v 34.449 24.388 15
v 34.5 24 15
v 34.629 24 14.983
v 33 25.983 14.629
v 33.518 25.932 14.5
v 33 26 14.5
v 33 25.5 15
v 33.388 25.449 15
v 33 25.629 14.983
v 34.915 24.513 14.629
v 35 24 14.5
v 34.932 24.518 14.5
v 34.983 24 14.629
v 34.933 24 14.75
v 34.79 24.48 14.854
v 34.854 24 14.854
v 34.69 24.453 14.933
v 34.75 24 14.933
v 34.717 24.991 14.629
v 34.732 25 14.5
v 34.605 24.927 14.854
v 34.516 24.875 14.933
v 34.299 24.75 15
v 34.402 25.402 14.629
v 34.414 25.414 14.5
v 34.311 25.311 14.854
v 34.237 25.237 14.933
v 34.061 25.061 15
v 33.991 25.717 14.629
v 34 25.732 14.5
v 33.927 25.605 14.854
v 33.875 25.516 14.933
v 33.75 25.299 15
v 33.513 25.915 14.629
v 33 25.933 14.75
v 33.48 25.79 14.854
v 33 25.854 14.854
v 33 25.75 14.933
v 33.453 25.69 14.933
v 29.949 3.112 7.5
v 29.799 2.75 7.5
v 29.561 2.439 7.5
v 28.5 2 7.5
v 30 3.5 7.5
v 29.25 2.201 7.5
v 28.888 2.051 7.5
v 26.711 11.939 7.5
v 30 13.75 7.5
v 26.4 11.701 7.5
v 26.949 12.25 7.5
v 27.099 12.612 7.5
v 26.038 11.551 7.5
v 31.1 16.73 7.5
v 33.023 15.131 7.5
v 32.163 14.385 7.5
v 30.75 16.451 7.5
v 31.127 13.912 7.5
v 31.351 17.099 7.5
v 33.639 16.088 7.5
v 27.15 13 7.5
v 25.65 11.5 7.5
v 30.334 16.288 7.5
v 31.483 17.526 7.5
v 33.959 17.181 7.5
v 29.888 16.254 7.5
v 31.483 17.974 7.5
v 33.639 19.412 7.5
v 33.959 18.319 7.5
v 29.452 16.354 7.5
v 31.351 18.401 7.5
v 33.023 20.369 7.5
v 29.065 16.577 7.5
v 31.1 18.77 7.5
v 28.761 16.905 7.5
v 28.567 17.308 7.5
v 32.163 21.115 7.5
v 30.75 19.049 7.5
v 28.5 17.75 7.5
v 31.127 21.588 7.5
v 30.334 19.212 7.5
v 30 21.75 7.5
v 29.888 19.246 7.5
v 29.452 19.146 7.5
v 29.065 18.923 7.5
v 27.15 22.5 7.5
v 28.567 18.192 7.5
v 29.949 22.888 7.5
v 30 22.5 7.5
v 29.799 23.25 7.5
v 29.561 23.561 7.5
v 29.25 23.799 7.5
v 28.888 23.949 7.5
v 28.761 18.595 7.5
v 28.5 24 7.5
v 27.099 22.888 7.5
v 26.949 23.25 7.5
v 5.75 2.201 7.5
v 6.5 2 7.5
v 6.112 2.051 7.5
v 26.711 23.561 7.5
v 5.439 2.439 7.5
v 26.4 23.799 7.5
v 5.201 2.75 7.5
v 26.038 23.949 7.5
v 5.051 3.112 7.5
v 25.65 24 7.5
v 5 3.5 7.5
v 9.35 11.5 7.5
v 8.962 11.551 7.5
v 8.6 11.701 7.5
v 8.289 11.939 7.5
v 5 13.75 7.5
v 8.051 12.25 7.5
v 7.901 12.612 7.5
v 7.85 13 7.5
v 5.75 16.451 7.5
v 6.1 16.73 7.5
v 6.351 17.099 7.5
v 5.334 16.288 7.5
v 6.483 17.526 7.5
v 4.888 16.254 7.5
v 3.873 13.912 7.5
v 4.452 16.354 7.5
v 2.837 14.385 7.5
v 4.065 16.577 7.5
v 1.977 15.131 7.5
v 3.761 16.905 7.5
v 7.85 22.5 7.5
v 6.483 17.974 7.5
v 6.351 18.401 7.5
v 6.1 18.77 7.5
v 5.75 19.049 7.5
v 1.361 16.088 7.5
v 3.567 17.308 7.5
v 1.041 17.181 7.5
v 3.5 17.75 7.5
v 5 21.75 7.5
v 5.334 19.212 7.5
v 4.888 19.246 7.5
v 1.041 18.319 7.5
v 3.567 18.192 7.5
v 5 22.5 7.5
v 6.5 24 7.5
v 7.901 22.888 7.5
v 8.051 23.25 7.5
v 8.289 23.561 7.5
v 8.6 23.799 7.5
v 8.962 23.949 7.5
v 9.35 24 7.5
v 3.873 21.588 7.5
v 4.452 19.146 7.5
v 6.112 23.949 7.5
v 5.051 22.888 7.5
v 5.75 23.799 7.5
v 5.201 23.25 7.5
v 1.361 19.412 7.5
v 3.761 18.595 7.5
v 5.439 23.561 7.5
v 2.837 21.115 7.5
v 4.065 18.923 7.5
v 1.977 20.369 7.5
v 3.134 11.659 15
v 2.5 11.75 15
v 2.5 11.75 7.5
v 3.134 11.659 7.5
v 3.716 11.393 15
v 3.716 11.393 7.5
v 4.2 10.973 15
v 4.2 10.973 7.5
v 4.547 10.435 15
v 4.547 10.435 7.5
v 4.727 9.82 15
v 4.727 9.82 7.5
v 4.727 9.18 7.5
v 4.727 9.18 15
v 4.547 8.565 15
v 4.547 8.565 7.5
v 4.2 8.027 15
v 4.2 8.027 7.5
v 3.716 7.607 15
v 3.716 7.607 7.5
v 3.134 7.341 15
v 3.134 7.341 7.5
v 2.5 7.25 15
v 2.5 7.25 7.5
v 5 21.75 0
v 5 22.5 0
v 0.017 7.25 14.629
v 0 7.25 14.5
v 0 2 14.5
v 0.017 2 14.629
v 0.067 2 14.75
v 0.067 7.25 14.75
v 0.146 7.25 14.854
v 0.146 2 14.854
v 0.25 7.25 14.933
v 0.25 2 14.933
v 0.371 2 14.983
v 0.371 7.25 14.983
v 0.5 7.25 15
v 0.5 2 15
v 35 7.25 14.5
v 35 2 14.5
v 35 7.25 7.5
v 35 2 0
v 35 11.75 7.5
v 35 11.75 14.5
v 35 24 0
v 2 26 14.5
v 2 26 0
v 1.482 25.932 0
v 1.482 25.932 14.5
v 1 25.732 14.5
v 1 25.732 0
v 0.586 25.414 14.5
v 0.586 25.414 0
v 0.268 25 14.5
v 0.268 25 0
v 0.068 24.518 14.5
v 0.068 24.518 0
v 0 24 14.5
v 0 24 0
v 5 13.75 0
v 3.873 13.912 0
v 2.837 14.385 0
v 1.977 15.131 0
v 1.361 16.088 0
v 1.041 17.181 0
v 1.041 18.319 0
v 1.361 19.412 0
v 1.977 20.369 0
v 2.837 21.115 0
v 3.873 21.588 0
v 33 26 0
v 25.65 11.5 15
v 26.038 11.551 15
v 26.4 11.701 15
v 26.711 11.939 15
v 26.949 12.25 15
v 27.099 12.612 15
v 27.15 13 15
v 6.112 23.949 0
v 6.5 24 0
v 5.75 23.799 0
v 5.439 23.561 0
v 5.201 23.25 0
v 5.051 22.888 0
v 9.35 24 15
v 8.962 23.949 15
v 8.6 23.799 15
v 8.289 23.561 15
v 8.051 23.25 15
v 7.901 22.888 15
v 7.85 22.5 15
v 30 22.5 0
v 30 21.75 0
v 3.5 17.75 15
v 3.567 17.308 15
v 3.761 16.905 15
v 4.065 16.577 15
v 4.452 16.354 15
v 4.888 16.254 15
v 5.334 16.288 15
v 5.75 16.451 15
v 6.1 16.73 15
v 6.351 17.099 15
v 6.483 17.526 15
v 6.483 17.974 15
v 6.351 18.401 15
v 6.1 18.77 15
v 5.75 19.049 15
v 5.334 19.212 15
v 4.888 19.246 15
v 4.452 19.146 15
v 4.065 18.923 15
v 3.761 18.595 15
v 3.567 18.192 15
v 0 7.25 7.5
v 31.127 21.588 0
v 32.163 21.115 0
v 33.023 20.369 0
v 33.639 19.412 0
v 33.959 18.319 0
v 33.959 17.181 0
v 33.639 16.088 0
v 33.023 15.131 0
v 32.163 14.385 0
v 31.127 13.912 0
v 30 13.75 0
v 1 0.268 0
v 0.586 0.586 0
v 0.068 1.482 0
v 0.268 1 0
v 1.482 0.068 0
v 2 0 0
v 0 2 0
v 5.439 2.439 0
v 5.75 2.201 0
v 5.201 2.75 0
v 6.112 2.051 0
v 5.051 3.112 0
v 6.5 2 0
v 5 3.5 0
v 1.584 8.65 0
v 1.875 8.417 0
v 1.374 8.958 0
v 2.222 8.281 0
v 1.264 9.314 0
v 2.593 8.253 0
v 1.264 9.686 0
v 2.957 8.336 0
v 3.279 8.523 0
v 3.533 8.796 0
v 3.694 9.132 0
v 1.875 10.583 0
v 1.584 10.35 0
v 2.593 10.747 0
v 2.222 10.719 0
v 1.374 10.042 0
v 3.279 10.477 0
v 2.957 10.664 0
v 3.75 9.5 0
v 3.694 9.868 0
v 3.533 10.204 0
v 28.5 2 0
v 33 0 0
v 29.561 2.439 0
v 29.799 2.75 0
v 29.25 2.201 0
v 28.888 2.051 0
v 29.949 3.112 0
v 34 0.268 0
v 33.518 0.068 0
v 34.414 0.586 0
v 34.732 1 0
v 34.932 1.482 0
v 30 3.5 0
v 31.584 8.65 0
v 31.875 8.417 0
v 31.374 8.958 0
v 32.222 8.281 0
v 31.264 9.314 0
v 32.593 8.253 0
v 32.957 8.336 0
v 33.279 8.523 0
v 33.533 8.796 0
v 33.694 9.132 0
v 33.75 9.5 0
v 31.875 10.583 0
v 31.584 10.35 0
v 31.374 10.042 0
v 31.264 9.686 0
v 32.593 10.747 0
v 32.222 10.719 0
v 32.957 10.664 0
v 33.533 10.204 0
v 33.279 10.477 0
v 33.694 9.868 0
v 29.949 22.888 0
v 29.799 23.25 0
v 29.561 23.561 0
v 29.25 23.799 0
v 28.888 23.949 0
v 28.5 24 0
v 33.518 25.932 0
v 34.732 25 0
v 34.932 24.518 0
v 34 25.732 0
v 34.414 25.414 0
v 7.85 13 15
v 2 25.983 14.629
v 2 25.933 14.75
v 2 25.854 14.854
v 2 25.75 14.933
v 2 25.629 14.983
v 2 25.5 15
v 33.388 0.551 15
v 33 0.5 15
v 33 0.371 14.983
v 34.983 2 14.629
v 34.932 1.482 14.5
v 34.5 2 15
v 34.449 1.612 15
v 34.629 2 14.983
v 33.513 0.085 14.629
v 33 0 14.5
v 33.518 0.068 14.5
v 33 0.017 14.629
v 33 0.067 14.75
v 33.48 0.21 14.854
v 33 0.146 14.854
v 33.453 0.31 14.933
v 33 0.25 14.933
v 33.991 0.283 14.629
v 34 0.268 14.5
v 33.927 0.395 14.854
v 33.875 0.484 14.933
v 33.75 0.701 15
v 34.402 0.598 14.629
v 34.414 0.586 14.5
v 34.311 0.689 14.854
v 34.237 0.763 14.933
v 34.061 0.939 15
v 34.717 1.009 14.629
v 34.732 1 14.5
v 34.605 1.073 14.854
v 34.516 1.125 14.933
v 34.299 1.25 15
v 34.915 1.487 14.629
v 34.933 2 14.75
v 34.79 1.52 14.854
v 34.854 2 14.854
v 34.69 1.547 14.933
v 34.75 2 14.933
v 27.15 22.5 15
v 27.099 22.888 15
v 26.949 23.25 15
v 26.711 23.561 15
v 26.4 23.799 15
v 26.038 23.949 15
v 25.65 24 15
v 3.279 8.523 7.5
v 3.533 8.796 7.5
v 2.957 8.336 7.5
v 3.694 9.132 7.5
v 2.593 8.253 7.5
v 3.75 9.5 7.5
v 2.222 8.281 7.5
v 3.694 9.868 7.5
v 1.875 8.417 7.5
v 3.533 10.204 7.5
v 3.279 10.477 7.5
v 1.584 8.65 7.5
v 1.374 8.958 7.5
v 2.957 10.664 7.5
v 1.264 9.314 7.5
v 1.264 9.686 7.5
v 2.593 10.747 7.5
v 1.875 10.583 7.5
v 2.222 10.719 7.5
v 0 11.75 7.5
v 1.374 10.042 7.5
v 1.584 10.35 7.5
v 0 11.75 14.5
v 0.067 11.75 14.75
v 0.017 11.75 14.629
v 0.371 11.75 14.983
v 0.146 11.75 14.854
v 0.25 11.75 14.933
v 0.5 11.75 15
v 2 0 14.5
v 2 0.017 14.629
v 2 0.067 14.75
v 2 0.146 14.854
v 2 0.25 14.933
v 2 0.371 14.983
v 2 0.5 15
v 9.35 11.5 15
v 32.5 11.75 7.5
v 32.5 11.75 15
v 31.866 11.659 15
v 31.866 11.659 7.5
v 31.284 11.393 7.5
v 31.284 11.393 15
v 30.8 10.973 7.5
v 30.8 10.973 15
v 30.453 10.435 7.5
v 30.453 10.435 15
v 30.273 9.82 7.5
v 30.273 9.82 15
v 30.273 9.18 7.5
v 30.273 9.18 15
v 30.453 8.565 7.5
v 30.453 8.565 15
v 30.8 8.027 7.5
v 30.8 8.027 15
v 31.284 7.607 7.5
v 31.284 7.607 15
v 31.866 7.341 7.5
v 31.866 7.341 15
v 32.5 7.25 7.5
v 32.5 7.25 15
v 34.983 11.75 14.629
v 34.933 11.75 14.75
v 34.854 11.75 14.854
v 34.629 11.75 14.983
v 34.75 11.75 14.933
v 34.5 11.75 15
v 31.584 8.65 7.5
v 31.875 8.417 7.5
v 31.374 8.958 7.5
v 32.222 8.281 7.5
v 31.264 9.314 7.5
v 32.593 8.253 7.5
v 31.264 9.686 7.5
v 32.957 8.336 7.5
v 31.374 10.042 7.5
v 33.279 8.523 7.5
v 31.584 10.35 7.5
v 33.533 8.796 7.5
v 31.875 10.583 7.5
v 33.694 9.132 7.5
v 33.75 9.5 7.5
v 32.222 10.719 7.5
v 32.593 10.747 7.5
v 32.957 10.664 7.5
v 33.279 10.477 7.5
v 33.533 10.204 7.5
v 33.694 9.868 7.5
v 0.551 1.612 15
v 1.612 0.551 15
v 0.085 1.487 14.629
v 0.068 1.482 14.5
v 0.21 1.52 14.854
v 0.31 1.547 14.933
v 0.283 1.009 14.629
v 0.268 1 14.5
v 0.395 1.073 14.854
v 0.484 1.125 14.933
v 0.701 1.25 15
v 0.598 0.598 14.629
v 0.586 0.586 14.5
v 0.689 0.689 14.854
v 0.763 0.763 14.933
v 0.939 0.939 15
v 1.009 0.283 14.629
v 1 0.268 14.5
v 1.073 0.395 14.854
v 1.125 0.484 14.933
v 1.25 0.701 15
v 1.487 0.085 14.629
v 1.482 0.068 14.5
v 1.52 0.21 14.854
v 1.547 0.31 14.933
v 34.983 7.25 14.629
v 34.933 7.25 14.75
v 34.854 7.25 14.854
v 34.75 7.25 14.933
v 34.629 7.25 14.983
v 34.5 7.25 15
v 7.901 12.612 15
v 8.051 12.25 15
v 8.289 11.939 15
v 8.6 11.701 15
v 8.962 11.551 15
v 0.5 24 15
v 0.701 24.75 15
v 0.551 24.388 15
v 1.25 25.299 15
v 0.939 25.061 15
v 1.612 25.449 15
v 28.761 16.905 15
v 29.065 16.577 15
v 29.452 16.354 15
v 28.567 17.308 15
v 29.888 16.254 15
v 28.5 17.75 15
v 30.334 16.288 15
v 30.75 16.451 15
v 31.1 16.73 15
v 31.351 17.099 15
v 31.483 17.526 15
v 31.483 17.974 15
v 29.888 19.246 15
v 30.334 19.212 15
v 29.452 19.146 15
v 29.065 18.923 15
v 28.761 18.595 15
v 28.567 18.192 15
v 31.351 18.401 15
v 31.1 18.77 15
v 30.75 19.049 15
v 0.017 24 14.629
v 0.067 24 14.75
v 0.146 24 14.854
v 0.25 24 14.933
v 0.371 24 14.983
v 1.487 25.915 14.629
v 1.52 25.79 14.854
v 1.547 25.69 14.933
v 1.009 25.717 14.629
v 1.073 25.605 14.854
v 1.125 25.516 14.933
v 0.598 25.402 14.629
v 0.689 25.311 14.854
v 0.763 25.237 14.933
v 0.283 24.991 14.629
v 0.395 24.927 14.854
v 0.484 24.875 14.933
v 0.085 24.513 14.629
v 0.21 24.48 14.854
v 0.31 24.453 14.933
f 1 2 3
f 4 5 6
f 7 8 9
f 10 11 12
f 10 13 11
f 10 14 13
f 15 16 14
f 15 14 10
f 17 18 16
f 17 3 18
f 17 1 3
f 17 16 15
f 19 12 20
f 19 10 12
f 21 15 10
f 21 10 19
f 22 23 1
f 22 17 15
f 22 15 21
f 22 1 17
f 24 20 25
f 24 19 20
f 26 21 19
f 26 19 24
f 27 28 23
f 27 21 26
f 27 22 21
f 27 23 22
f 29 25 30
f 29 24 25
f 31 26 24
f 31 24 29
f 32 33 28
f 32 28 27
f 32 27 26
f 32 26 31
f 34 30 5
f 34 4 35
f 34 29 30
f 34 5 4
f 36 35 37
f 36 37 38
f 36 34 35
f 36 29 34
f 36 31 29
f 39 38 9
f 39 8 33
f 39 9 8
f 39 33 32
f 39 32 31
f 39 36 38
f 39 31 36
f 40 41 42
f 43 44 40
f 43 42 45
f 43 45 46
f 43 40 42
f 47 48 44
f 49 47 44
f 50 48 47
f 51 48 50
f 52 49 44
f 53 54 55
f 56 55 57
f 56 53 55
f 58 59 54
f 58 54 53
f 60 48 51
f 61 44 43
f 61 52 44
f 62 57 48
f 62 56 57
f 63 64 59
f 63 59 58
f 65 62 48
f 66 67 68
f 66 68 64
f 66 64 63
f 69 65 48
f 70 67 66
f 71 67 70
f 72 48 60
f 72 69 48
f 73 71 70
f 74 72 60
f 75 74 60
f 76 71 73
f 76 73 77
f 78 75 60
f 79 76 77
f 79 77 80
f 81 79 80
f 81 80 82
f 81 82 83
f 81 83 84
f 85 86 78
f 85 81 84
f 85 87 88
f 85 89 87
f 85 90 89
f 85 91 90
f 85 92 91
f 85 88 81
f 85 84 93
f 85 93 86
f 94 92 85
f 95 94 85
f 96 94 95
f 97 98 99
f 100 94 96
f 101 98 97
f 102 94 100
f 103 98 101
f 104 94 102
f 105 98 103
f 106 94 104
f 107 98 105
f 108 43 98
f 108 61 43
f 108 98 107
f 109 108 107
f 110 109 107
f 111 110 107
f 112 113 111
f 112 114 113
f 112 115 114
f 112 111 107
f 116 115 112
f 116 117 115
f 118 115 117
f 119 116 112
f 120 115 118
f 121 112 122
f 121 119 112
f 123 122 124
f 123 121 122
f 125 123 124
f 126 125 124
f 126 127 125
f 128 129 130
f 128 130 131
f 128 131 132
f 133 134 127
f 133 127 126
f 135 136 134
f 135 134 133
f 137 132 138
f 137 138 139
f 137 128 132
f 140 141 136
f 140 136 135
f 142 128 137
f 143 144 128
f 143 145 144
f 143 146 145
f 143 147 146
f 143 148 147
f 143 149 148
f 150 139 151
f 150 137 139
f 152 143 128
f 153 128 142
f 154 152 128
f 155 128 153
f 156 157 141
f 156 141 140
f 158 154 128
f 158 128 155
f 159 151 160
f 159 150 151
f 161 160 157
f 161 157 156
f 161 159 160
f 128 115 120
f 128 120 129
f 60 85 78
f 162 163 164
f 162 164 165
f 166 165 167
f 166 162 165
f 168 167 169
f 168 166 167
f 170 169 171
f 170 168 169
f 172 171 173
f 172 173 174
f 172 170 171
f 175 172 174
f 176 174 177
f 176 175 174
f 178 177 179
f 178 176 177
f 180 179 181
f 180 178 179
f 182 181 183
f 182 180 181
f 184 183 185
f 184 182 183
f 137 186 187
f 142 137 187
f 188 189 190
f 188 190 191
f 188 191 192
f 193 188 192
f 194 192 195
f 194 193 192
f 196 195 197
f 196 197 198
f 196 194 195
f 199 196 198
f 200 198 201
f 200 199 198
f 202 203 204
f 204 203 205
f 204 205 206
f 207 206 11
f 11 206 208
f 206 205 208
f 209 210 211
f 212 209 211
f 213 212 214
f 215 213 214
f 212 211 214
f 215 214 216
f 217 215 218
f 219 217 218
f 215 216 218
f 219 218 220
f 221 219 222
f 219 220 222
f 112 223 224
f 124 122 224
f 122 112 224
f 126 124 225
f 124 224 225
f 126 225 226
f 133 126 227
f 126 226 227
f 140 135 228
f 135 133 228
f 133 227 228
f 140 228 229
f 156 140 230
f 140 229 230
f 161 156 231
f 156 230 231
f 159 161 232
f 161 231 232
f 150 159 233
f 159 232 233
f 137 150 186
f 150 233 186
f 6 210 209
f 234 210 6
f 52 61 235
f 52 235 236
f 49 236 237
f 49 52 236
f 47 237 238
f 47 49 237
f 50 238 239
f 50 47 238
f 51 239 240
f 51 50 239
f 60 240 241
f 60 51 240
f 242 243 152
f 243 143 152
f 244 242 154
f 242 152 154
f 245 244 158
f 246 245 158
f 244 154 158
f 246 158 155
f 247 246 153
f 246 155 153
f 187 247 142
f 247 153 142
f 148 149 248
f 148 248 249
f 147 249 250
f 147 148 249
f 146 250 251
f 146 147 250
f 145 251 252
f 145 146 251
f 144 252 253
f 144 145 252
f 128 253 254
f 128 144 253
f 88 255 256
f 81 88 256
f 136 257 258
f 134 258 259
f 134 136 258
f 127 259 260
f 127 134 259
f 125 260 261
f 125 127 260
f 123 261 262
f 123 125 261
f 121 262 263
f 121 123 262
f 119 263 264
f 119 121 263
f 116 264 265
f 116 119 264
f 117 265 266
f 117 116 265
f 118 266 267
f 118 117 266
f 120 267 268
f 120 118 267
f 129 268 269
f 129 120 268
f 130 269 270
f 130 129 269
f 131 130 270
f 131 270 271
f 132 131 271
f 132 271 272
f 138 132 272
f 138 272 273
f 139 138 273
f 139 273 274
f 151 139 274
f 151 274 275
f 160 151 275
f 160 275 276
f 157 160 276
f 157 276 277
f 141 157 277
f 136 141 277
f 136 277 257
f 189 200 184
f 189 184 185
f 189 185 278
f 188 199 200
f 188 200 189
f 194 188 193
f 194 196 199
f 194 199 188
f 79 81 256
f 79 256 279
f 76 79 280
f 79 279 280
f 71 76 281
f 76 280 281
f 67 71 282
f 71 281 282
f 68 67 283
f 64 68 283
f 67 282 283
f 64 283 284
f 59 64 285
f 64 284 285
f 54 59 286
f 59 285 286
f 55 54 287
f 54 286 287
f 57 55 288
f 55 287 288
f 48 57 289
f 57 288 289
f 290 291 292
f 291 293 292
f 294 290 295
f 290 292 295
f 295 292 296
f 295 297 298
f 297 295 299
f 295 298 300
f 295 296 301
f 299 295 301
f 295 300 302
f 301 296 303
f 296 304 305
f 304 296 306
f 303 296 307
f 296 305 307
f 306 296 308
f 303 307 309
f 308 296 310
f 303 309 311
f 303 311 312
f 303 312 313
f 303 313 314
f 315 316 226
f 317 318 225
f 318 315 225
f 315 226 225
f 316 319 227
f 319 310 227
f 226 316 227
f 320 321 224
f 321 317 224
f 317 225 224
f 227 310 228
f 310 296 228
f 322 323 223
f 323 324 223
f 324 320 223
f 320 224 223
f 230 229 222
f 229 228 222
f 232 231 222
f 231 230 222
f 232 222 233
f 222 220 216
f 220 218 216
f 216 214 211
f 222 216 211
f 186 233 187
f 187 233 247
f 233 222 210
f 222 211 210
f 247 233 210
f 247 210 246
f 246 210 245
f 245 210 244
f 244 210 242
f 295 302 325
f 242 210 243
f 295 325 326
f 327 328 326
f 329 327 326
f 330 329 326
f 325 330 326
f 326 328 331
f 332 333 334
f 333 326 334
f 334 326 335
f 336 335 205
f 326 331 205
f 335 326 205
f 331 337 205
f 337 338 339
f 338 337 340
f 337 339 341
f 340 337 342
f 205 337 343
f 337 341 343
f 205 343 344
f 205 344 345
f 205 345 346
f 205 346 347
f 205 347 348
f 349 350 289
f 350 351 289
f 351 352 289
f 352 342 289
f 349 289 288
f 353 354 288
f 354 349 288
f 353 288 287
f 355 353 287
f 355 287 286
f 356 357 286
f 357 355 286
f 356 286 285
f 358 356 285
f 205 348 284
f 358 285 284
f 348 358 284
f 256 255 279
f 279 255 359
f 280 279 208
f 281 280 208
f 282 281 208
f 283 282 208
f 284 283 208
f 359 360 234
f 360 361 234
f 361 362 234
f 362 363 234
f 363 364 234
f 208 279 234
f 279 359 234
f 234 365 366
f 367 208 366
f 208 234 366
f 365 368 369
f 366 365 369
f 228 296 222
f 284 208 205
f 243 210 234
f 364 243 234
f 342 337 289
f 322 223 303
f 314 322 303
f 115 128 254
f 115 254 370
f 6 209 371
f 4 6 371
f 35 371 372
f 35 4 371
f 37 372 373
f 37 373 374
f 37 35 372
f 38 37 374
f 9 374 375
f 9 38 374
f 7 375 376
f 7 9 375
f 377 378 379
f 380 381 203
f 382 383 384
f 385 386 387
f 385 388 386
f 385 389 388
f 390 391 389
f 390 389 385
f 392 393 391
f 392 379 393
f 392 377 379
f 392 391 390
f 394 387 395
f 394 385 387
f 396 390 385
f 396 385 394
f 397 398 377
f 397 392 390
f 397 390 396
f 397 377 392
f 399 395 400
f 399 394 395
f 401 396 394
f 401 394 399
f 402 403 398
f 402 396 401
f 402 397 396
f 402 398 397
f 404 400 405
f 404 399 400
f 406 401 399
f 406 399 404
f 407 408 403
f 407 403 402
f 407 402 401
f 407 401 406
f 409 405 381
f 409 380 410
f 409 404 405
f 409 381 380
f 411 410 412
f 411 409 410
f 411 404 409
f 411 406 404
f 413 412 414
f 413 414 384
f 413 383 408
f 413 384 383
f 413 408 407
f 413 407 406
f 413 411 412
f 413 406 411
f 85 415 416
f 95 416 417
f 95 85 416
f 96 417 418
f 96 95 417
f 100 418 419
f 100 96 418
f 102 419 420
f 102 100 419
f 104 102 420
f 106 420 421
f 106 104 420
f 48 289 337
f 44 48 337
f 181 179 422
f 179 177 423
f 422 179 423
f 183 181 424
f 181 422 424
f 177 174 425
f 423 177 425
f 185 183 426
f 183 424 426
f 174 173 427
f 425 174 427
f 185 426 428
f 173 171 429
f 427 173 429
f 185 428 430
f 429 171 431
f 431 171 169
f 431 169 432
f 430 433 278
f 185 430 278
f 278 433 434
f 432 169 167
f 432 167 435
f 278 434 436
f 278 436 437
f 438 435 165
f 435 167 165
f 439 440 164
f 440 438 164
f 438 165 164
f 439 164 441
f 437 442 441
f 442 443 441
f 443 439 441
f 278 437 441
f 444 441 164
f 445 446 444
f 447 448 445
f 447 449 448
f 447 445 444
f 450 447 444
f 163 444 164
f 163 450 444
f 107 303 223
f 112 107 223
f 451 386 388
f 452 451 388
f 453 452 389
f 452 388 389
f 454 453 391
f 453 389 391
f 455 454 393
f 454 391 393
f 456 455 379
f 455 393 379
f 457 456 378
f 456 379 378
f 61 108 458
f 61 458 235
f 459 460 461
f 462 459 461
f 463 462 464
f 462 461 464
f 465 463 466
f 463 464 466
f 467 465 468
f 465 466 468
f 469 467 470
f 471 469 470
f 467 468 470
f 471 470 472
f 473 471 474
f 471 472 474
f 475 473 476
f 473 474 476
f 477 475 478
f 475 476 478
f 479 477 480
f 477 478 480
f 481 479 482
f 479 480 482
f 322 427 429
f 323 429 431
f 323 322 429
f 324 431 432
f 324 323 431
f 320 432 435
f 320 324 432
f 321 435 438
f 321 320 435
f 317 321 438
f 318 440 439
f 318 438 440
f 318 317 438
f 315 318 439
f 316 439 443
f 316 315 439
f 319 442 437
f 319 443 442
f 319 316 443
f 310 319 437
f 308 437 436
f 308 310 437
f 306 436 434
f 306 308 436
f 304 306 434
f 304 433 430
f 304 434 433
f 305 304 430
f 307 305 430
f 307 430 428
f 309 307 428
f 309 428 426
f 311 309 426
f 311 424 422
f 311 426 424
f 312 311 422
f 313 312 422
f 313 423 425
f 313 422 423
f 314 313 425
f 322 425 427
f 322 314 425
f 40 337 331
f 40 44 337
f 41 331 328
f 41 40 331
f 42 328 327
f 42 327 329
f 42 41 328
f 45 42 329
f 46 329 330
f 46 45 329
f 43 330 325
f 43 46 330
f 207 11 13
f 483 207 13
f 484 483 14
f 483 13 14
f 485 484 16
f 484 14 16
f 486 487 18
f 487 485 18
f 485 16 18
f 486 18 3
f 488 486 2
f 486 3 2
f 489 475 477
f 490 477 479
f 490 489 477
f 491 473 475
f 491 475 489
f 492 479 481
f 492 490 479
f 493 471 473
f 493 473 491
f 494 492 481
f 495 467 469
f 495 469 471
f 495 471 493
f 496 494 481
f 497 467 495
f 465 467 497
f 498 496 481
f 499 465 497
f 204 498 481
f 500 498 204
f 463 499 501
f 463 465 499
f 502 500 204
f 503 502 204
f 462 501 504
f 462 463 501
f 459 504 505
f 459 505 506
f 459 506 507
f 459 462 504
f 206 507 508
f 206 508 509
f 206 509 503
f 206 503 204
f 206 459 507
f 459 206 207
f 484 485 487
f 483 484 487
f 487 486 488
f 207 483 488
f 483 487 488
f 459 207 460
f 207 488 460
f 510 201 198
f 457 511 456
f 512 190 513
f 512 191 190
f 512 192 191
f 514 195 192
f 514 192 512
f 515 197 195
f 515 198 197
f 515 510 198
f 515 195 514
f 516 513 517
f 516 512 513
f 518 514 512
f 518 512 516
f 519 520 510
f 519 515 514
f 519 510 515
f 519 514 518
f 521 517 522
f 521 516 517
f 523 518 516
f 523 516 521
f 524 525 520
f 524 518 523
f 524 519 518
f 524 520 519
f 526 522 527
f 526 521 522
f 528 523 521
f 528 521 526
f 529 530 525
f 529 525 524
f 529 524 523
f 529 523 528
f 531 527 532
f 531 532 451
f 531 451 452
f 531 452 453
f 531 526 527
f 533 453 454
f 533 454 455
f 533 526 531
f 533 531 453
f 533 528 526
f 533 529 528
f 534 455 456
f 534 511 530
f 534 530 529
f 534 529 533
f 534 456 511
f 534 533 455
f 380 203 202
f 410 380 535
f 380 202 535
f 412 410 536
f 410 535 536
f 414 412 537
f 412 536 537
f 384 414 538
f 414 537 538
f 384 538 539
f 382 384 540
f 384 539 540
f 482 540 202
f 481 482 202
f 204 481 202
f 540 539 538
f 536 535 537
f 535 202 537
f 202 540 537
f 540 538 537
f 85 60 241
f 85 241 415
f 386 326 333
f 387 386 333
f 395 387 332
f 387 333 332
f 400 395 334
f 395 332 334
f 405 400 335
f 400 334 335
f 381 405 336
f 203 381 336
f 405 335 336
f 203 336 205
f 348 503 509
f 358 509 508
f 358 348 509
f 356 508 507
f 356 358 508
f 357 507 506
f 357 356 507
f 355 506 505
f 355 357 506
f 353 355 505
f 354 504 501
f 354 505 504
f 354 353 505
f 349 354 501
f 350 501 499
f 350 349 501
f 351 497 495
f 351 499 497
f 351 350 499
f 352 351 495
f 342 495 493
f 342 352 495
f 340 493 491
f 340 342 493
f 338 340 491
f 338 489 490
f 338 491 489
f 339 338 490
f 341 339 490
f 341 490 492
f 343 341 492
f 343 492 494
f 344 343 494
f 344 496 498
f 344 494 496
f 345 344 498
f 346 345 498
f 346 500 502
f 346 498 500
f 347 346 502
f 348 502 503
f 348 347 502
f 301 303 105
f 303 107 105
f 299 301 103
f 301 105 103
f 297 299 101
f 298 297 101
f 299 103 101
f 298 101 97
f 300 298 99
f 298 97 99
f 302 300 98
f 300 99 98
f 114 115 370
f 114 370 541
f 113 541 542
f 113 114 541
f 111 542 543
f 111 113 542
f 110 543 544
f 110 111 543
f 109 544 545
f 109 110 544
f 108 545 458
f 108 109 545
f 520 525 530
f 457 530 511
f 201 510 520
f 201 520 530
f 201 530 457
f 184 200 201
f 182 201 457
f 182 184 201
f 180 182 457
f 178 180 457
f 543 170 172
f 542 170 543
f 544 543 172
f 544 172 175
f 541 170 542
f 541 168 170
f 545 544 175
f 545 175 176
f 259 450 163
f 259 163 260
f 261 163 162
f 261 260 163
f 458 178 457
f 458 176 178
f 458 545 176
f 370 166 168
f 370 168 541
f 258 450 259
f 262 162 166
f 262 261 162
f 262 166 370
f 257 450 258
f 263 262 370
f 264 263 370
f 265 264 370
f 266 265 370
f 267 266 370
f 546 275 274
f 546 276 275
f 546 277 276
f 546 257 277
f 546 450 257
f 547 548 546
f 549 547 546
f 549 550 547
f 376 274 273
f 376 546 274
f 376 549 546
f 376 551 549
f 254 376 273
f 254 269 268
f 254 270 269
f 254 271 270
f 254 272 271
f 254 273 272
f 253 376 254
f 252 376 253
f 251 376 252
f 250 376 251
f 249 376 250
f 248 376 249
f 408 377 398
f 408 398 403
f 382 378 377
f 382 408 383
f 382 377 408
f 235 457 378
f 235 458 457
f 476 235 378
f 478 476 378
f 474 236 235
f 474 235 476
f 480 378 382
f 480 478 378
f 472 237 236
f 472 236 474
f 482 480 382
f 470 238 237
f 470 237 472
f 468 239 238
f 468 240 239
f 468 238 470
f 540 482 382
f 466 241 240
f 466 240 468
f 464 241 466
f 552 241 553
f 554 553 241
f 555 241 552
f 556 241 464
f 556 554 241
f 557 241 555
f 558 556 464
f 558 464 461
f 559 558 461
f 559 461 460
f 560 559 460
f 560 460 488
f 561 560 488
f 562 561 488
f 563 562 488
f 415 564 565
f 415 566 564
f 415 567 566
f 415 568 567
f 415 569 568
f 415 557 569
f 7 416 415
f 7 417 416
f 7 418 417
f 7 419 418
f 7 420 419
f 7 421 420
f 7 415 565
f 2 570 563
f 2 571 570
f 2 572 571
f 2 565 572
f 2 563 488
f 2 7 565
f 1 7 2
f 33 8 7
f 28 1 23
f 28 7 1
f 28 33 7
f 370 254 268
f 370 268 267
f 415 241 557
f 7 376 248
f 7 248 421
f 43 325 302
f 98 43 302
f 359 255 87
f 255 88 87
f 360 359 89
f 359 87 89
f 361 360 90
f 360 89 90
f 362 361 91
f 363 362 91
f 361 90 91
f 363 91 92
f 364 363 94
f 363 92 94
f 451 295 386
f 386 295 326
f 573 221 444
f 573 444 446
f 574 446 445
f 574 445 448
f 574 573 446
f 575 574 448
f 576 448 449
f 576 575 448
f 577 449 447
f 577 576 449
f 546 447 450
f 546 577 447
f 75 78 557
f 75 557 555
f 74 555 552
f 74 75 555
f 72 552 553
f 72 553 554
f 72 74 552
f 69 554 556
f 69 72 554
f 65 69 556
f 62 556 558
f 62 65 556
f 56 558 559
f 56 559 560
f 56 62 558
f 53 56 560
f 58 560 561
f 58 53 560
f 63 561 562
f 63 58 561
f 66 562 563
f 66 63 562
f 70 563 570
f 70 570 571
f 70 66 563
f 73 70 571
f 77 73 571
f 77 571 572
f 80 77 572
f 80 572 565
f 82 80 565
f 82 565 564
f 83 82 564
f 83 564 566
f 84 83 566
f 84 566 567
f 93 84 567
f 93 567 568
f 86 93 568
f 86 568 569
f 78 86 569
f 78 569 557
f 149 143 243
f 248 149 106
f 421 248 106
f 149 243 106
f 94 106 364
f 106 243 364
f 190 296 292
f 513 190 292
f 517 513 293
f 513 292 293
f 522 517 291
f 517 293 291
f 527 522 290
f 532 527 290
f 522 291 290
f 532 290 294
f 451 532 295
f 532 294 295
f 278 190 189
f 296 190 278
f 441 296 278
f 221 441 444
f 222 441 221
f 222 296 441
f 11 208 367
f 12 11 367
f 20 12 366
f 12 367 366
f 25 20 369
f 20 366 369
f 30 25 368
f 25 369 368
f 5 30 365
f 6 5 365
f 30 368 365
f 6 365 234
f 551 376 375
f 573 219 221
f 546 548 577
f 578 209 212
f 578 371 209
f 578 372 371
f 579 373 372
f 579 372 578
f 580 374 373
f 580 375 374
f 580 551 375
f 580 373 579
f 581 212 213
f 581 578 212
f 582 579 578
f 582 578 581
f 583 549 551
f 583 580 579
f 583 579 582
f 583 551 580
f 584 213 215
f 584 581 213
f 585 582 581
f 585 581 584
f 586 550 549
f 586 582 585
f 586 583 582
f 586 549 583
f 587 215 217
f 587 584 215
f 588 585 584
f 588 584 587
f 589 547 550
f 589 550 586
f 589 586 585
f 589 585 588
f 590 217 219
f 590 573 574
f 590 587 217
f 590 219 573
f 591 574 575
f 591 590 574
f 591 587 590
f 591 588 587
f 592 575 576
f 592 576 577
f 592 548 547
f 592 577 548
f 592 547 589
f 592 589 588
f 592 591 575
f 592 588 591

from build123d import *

# Parameters (mm, degrees)
SKETCH_1_W          = 35
SKETCH_1_H          = 26
SKETCH_1_R          = 1.25
EXTRUDE_1_DEPTH     = 15
CUT_EXTRUDE_1_DEPTH = 7.5
FILLET_1_R          = 1.5
FILLET_2_R          = 0.5
CUT_EXTRUDE_START   = -10
SKETCH_8_R          = 1.5
CUT_EXTRUDE_5_DEPTH = 10
CUT_EXTRUDE_6_DEPTH = 7.5
FILLET_3_R          = 2
SKETCH_10_R         = 4
CUT_EXTRUDE_7_DEPTH = 7.5


with BuildPart() as part:
    # Эскиз1 → Вытянуть1 (new body)
    with BuildSketch(Plane.XY):
        with Locations((17.5, 13)):
            Rectangle(SKETCH_1_W, SKETCH_1_H)
        with Locations((2.5, 9.5)):
            Circle(SKETCH_1_R, mode=Mode.SUBTRACT)
        with Locations((32.5, 9.5)):
            Circle(SKETCH_1_R, mode=Mode.SUBTRACT)
    extrude(amount=EXTRUDE_1_DEPTH)

    # Эскиз2 → Вырез-Вытянуть1 (cut)
    with BuildSketch(Plane(origin=(0, 0, 0), x_dir=(-1, 0, 0), z_dir=(0, 0, -1))):
        with BuildLine():
            Line((-30, 2), (-5, 2))
            Line((-5, 2), (-5, 16.25))
            ThreePointArc((-5, 16.25), (-3.5, 17.75), (-5, 19.25))
            Line((-5, 19.25), (-5, 24))
            Line((-5, 24), (-30, 24))
            Line((-30, 24), (-30, 19.25))
            ThreePointArc((-30, 19.25), (-31.5, 17.75), (-30, 16.25))
            Line((-30, 16.25), (-30, 2))
        make_face()
    extrude(amount=-CUT_EXTRUDE_1_DEPTH, mode=Mode.SUBTRACT)

    # Скругление1
    fillet_1_edges = [part.edges().sort_by_distance(p)[0] for p in [
        (30, 24, 3.75),
        (5, 24, 3.75),
        (5, 2, 3.75),
        (30, 2, 3.75),
    ]]
    fillet(fillet_1_edges, radius=FILLET_1_R)

    # Скругление2
    fillet_2_edges = [part.edges().sort_by_distance(p)[0] for p in [
        (17.5, 0, 15),
        (0, 13, 15),
        (35, 13, 15),
        (17.5, 26, 15),
    ]]
    fillet(fillet_2_edges, radius=FILLET_2_R)

    # Эскиз8 → Вырез-Вытянуть5 (cut)
    with BuildSketch(Plane.XY.offset(15).offset(CUT_EXTRUDE_START)):
        with Locations(Location((5, 17.75, 0), (0, 0, 180))):
            Circle(SKETCH_8_R)
        with Locations(Location((30, 17.75, 0), (0, 0, 180))):
            Circle(SKETCH_8_R)
        with BuildLine():
            Line((9.35, 11.5), (25.65, 11.5))
            ThreePointArc((25.65, 11.5), (26.710660172, 11.939339828), (27.15, 13))
            Line((27.15, 13), (27.15, 22.5))
            ThreePointArc((27.15, 22.5), (26.710660172, 23.560660172), (25.65, 24))
            Line((25.65, 24), (9.35, 24))
            ThreePointArc((9.35, 24), (8.289339828, 23.560660172), (7.85, 22.5))
            Line((7.85, 22.5), (7.85, 13))
            ThreePointArc((7.85, 13), (8.289339828, 11.939339828), (9.35, 11.5))
        make_face()
    extrude(amount=CUT_EXTRUDE_5_DEPTH, mode=Mode.SUBTRACT)

    # Эскиз9 → Вырез-Вытянуть6 (cut)
    with BuildSketch(Plane.XY.offset(15)):
        with BuildLine():
            Line((2.5, 7.25), (-1.280678269, 7.25))
            Line((-1.280678269, 7.25), (-1.280678269, 11.75))
            Line((-1.280678269, 11.75), (2.5, 11.75))
            ThreePointArc((2.5, 11.75), (4.75, 9.5), (2.5, 7.25))
        make_face()
        with BuildLine():
            Line((32.5, 7.25), (36.280678269, 7.25))
            Line((36.280678269, 7.25), (36.280678269, 11.75))
            Line((36.280678269, 11.75), (32.5, 11.75))
            ThreePointArc((32.5, 11.75), (30.25, 9.5), (32.5, 7.25))
        make_face()
    extrude(amount=-CUT_EXTRUDE_6_DEPTH, mode=Mode.SUBTRACT)

    # Скругление3
    # the kernel refuses this fillet: 2 mm, written as the material it takes off along each edge
    with BuildSketch(Plane(origin=(33, 24, 15), x_dir=(1, 0, 0), z_dir=(0, -1, 0))) as fillet_3_piece_1:
        with BuildLine():
            CenterArc((1.5, -0.5), 0.5, 0, 90)
            Line((2, -0.5), (2, 0))
            Line((2, 0), (1.5, 0))
        make_face()
    revolve(axis=Axis((33, 24, 15), (0, 0, 1)), revolution_arc=90, mode=Mode.SUBTRACT)
    with BuildSketch(Plane(origin=(2, 24, 15), x_dir=(0, 1, 0), z_dir=(1, 0, 0))) as fillet_3_piece_2:
        with BuildLine():
            CenterArc((1.5, -0.5), 0.5, 0, 90)
            Line((2, -0.5), (2, 0))
            Line((2, 0), (1.5, 0))
        make_face()
    revolve(axis=Axis((2, 24, 15), (0, 0, 1)), revolution_arc=90, mode=Mode.SUBTRACT)
    with BuildSketch(Plane(origin=(33, 2, 15), x_dir=(0, -1, 0), z_dir=(-1, 0, 0))) as fillet_3_piece_3:
        with BuildLine():
            CenterArc((1.5, -0.5), 0.5, 0, 90)
            Line((2, -0.5), (2, 0))
            Line((2, 0), (1.5, 0))
        make_face()
    revolve(axis=Axis((33, 2, 15), (0, 0, 1)), revolution_arc=90, mode=Mode.SUBTRACT)
    with BuildSketch(Plane(origin=(2, 2, 15), x_dir=(-1, 0, 0), z_dir=(0, 1, 0))) as fillet_3_piece_4:
        with BuildLine():
            CenterArc((1.5, -0.5), 0.5, 0, 90)
            Line((2, -0.5), (2, 0))
            Line((2, 0), (1.5, 0))
        make_face()
    revolve(axis=Axis((2, 2, 15), (0, 0, 1)), revolution_arc=90, mode=Mode.SUBTRACT)
    with BuildSketch(Plane(origin=(0, 0, -5), x_dir=(1, 0, 0), z_dir=(0, 0, 1)), Plane(origin=(0, 26, -5), x_dir=(0, -1, 0), z_dir=(0, 0, 1))) as fillet_3_piece_5:
        with BuildLine():
            CenterArc((FILLET_3_R, FILLET_3_R), FILLET_3_R, 180, 90)
            Line((0, FILLET_3_R), (0, 0))
            Line((0, 0), (FILLET_3_R, 0))
        make_face()
    extrude(amount=20, mode=Mode.SUBTRACT)
    with BuildSketch(Plane(origin=(35, 0, -5), x_dir=(-1, 0, 0), z_dir=(0, 0, 1)), Plane(origin=(35, 26, -5), x_dir=(0, -1, 0), z_dir=(0, 0, 1))) as fillet_3_piece_6:
        with BuildLine():
            CenterArc((FILLET_3_R, -FILLET_3_R), FILLET_3_R, 90, 90)
            Line((0, -FILLET_3_R), (0, 0))
            Line((0, 0), (FILLET_3_R, 0))
        make_face()
    extrude(amount=20, mode=Mode.SUBTRACT)

    # Эскиз10 → Вырез-Вытянуть7 (cut)
    with BuildSketch(Plane(origin=(0, 0, 0), x_dir=(-1, 0, 0), z_dir=(0, 0, -1))):
        with Locations((-5, 17.75)):
            Circle(SKETCH_10_R)
        with Locations((-30, 17.75)):
            Circle(SKETCH_10_R)
    extrude(amount=-CUT_EXTRUDE_7_DEPTH, mode=Mode.SUBTRACT)


solid = part.part
